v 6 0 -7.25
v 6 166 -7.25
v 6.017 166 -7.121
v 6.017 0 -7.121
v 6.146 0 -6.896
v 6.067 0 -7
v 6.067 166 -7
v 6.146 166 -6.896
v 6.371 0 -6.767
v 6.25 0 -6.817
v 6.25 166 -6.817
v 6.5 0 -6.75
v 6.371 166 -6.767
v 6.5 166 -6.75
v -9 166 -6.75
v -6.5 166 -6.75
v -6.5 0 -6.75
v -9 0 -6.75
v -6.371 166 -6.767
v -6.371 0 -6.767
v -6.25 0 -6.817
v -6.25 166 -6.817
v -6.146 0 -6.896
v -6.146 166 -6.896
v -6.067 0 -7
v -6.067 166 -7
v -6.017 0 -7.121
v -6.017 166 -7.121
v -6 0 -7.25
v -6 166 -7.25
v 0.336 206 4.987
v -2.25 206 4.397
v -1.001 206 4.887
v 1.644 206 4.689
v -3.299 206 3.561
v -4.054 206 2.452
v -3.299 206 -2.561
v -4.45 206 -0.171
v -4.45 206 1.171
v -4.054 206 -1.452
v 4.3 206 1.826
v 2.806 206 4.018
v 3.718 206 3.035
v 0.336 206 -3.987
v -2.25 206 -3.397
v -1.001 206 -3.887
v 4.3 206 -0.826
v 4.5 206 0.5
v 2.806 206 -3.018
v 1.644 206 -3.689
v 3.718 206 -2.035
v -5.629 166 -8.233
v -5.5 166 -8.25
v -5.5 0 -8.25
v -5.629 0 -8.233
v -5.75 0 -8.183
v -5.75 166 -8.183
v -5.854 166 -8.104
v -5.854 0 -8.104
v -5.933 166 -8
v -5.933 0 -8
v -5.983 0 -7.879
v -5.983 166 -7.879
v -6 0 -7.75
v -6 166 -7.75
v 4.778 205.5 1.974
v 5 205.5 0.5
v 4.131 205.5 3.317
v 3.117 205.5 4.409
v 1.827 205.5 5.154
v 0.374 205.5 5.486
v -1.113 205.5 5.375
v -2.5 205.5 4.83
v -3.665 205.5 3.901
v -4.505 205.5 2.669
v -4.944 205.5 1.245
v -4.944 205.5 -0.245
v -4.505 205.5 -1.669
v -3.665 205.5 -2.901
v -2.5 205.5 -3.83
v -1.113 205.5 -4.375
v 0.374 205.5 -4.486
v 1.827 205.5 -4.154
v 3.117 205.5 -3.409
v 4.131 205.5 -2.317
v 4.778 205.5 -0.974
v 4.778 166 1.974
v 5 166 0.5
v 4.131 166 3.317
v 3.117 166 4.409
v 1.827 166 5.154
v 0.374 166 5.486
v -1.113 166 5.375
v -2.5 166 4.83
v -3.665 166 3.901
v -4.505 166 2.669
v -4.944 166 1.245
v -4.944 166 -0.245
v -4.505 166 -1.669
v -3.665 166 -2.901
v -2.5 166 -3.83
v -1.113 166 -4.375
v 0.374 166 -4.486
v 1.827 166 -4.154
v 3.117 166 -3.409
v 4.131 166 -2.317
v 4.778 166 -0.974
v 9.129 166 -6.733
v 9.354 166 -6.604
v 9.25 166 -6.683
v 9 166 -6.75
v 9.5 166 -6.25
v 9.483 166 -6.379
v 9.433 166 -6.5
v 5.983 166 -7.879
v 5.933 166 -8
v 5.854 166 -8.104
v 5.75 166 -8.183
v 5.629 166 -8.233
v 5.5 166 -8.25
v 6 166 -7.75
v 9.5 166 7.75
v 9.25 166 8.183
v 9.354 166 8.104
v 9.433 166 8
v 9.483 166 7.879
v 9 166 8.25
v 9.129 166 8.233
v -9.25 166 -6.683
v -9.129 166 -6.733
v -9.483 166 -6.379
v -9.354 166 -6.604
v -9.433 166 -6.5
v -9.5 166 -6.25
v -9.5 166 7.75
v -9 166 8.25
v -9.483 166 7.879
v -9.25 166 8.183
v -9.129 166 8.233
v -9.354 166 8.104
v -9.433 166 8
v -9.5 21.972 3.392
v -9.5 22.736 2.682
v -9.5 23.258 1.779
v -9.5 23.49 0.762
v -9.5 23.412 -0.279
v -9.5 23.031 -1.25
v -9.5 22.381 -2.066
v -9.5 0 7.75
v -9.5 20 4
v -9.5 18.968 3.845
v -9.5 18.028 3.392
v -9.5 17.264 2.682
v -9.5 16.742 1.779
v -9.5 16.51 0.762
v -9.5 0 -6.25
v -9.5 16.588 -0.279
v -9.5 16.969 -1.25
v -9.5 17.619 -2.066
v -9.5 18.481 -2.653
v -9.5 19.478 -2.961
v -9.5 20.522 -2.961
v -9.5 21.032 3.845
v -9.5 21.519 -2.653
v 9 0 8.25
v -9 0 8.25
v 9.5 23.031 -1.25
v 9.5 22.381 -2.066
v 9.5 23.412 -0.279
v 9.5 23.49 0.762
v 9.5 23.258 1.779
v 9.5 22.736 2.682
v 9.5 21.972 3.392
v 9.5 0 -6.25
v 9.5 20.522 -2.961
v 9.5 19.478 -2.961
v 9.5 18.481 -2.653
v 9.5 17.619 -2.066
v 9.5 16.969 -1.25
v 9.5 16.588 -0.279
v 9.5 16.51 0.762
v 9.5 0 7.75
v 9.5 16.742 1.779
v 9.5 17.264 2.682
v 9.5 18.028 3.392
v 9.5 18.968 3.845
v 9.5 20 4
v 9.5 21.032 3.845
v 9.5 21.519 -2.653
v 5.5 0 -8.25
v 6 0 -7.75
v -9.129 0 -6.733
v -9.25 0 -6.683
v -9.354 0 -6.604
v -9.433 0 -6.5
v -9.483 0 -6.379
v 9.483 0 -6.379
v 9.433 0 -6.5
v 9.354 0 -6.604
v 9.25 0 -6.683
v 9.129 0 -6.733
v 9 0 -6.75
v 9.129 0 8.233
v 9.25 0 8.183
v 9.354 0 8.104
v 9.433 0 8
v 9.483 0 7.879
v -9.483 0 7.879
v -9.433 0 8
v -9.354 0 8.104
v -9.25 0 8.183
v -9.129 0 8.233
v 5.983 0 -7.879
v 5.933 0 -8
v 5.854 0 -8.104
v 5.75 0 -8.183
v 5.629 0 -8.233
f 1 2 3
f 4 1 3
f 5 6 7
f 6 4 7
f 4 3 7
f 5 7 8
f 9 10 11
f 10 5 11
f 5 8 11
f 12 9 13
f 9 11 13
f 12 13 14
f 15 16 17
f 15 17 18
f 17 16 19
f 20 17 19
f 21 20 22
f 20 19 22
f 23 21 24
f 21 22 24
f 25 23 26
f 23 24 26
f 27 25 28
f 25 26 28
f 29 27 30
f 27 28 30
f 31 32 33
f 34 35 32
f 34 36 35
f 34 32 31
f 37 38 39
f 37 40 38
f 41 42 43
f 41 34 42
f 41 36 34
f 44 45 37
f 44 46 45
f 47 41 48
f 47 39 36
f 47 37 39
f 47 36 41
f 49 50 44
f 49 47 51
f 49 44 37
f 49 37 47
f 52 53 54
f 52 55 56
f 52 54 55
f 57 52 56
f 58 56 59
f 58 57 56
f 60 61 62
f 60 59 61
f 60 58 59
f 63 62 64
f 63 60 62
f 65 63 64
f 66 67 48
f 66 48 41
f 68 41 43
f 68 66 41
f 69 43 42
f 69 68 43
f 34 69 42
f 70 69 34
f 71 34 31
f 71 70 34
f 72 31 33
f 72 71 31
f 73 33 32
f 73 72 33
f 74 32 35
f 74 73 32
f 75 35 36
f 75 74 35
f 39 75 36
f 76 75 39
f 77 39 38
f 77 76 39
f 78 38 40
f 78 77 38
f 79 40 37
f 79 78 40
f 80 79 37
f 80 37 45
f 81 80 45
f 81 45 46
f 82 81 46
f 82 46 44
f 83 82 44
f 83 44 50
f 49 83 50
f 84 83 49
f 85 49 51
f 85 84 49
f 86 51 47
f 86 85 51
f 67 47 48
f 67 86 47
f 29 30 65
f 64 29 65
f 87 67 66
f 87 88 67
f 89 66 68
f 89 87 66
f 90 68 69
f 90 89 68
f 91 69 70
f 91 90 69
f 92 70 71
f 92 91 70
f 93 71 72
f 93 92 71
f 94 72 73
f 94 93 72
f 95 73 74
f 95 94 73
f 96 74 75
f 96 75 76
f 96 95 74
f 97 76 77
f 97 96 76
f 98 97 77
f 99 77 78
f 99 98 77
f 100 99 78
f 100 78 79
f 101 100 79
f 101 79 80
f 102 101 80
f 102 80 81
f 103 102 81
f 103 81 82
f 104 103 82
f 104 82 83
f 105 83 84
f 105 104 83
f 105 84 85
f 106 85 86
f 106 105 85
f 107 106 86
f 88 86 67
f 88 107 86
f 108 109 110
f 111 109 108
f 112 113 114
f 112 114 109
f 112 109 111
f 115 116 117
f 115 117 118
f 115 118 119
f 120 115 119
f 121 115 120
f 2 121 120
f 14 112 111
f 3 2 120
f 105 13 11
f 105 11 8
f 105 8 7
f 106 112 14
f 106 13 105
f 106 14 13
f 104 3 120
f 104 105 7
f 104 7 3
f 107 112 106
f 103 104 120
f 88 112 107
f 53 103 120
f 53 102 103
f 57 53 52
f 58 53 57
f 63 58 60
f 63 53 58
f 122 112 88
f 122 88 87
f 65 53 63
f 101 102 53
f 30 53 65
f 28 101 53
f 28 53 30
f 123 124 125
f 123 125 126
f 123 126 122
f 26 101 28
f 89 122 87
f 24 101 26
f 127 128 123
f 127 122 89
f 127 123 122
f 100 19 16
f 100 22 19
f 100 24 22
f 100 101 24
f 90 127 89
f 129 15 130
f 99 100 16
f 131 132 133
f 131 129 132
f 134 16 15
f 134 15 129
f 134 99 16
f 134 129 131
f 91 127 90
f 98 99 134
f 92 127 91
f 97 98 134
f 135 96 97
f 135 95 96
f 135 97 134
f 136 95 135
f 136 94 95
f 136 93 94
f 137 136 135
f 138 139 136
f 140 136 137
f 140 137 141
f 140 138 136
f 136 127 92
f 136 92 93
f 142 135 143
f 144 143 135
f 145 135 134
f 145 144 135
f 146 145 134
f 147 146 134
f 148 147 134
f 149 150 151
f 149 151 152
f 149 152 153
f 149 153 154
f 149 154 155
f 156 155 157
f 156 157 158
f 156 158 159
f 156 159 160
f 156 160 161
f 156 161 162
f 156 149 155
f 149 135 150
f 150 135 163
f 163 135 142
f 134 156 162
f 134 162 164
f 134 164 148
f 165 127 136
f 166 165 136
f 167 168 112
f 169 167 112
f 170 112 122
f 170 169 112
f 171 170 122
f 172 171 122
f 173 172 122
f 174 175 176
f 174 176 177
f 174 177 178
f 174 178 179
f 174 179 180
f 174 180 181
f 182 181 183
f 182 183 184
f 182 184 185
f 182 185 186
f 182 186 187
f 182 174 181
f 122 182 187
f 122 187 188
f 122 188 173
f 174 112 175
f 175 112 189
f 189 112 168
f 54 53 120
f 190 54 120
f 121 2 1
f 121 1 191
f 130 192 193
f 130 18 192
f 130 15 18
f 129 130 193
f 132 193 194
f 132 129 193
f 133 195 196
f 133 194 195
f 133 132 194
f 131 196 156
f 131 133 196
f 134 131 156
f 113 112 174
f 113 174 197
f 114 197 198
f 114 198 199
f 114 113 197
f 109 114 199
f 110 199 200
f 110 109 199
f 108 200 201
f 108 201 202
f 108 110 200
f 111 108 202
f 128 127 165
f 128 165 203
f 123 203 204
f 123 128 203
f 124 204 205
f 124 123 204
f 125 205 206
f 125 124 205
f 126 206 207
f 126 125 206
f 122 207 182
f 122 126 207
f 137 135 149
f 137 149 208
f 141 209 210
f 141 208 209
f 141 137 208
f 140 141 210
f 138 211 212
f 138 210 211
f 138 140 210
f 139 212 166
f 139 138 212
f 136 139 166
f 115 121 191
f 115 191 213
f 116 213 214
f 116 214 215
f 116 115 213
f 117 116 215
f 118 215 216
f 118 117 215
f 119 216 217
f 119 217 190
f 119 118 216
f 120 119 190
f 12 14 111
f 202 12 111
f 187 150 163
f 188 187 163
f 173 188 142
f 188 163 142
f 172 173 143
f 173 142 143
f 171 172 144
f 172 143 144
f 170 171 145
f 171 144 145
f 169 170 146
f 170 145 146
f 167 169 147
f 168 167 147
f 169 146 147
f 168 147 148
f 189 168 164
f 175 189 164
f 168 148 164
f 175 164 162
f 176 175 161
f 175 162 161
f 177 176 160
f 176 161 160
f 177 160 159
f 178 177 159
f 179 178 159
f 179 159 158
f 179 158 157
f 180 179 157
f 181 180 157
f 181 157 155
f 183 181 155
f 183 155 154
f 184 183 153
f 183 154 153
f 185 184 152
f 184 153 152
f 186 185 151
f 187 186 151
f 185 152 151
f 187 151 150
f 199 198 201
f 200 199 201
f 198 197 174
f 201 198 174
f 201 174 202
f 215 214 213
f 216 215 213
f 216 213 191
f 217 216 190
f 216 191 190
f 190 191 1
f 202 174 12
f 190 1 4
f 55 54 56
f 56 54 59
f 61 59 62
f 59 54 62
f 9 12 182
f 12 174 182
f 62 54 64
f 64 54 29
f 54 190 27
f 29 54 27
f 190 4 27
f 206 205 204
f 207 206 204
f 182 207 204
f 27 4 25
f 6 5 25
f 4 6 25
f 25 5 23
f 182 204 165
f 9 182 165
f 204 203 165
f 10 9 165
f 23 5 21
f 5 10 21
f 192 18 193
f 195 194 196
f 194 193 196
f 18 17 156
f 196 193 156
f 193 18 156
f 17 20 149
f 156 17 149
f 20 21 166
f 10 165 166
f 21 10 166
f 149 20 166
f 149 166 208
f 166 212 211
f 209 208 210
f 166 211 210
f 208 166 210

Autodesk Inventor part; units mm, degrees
ref_plane "YZ Plane" through (0, 0, 0) normal (1, 0, 0) x (0, 1, 0)
ref_plane "XZ Plane" through (0, 0, 0) normal (0, 1, 0) x (-1, 0, 0)
ref_plane "XY Plane" through (0, 0, 0) normal (0, 0, 1) x (1, 0, 0)
sketch "Sketch1" plane through (0, 0, 0) normal (0, 1, 0) x (-1, 0, 0)
  line L0 (-9.5, 8.25) -> (9.5, 8.25)
  line L1 (9.5, 8.25) -> (9.5, -8.25)
  line L2 (9.5, -8.25) -> (-9.5, -8.25)
  line L3 (-9.5, -8.25) -> (-9.5, 8.25)
  line L4 (-9.5, 8.25) -> (9.5, -8.25) construction
  line L5 (9.5, 8.25) -> (-9.5, -8.25) construction
  line L6 (-6, 6.75) -> (6, 6.75)
  line L7 (6, 6.75) -> (6, -6.75)
  line L8 (6, -6.75) -> (-6, -6.75)
  line L9 (-6, -6.75) -> (-6, 6.75)
  line L10 (-6, 6.75) -> (6, -6.75) construction
  line L11 (6, 6.75) -> (-6, -6.75) construction
  line L12 (6, -6.75) -> (9.5, -6.75)
  line L13 (-6, -6.75) -> (-9.7082, -6.75)
  line L14 (6, -6.75) -> (6, -8.25)
  line L15 (-6, -6.75) -> (-6, -8.25)
  point P0 (0, 0)
  point P1 (-9.5, -6.75)
  dimension "d0" = 19
  dimension "d1" = 16.5
  dimension "d2" = 12
  dimension "d3" = 1.5
extrude "Extrusion1" add sketch "Sketch1" along normal blind 166 contours L0 L1 L12 L7 L6 L9 L13 L3 | L9 L6 L7 L8 | L8 L14 L2 L15
sketch "Sketch2" plane through (0, 166, 0) normal (0, 1, 0) x (1, 0, 0)
  line L0 (-9.5, -8.25) -> (9.5, -8.25) projected
  line L1 (9.5, -8.25) -> (0, -8.25)
  line L2 (0, -8.25) -> (0, -0.5)
  line L3 (0, -0.5) -> (9.5, -0.5)
  line L4 (9.5, -0.5) -> (9.5, -8.25)
  circle A0 centre (0, -0.5) radius 5
  point P0 (0, 0)
  dimension "d6" = 7.75
  dimension "d7" = 10
extrude "Extrusion2" add sketch "Sketch2" along normal blind 40 contours A0 L3 L2 | L2 L3 A0
thread "Thread1" size "M10x1.5" class "6g" standard "ANSI Metric M Profile" length 40
chamfer "Chamfer1" distance 0.5 angle 45 1 edges at (-5, 206, 0.5)
fillet "Fillet1" radius 0.5 8 edges at (9.5, 83, -6.75) (6, 83, -8.25) (9.5, 83, 8.25) (-9.5, 83, 8.25) (-9.5, 83, -6.75) (-6, 83, -6.75) (-6, 83, -8.25) (6, 83, -6.75)
sketch "Sketch3" plane through (-9.5, 0, -6.25) normal (-1, 0, 0) x (0, 0, 1)
  line L0 (14.5, 0) -> (14.5, 166) projected
  line L1 (14.5, 0) -> (6.75, 0)
  line L2 (6.75, 0) -> (6.75, 206.1896)
  line L3 (6.75, 206.1896) -> (14.5, 206.1896)
  line L4 (14.5, 206.1896) -> (14.5, 0)
  line L5 (6.75, 0) -> (6.75, 20)
  circle A0 centre (6.75, 20) radius 3.5
  point P0 (6.25, 0)
  dimension "d16" = 20
  dimension "d17" = 7
extrude "Extrusion3" cut sketch "Sketch3" against normal through all contours A0 L2 | L2 A0
properties part number "oszlop"
